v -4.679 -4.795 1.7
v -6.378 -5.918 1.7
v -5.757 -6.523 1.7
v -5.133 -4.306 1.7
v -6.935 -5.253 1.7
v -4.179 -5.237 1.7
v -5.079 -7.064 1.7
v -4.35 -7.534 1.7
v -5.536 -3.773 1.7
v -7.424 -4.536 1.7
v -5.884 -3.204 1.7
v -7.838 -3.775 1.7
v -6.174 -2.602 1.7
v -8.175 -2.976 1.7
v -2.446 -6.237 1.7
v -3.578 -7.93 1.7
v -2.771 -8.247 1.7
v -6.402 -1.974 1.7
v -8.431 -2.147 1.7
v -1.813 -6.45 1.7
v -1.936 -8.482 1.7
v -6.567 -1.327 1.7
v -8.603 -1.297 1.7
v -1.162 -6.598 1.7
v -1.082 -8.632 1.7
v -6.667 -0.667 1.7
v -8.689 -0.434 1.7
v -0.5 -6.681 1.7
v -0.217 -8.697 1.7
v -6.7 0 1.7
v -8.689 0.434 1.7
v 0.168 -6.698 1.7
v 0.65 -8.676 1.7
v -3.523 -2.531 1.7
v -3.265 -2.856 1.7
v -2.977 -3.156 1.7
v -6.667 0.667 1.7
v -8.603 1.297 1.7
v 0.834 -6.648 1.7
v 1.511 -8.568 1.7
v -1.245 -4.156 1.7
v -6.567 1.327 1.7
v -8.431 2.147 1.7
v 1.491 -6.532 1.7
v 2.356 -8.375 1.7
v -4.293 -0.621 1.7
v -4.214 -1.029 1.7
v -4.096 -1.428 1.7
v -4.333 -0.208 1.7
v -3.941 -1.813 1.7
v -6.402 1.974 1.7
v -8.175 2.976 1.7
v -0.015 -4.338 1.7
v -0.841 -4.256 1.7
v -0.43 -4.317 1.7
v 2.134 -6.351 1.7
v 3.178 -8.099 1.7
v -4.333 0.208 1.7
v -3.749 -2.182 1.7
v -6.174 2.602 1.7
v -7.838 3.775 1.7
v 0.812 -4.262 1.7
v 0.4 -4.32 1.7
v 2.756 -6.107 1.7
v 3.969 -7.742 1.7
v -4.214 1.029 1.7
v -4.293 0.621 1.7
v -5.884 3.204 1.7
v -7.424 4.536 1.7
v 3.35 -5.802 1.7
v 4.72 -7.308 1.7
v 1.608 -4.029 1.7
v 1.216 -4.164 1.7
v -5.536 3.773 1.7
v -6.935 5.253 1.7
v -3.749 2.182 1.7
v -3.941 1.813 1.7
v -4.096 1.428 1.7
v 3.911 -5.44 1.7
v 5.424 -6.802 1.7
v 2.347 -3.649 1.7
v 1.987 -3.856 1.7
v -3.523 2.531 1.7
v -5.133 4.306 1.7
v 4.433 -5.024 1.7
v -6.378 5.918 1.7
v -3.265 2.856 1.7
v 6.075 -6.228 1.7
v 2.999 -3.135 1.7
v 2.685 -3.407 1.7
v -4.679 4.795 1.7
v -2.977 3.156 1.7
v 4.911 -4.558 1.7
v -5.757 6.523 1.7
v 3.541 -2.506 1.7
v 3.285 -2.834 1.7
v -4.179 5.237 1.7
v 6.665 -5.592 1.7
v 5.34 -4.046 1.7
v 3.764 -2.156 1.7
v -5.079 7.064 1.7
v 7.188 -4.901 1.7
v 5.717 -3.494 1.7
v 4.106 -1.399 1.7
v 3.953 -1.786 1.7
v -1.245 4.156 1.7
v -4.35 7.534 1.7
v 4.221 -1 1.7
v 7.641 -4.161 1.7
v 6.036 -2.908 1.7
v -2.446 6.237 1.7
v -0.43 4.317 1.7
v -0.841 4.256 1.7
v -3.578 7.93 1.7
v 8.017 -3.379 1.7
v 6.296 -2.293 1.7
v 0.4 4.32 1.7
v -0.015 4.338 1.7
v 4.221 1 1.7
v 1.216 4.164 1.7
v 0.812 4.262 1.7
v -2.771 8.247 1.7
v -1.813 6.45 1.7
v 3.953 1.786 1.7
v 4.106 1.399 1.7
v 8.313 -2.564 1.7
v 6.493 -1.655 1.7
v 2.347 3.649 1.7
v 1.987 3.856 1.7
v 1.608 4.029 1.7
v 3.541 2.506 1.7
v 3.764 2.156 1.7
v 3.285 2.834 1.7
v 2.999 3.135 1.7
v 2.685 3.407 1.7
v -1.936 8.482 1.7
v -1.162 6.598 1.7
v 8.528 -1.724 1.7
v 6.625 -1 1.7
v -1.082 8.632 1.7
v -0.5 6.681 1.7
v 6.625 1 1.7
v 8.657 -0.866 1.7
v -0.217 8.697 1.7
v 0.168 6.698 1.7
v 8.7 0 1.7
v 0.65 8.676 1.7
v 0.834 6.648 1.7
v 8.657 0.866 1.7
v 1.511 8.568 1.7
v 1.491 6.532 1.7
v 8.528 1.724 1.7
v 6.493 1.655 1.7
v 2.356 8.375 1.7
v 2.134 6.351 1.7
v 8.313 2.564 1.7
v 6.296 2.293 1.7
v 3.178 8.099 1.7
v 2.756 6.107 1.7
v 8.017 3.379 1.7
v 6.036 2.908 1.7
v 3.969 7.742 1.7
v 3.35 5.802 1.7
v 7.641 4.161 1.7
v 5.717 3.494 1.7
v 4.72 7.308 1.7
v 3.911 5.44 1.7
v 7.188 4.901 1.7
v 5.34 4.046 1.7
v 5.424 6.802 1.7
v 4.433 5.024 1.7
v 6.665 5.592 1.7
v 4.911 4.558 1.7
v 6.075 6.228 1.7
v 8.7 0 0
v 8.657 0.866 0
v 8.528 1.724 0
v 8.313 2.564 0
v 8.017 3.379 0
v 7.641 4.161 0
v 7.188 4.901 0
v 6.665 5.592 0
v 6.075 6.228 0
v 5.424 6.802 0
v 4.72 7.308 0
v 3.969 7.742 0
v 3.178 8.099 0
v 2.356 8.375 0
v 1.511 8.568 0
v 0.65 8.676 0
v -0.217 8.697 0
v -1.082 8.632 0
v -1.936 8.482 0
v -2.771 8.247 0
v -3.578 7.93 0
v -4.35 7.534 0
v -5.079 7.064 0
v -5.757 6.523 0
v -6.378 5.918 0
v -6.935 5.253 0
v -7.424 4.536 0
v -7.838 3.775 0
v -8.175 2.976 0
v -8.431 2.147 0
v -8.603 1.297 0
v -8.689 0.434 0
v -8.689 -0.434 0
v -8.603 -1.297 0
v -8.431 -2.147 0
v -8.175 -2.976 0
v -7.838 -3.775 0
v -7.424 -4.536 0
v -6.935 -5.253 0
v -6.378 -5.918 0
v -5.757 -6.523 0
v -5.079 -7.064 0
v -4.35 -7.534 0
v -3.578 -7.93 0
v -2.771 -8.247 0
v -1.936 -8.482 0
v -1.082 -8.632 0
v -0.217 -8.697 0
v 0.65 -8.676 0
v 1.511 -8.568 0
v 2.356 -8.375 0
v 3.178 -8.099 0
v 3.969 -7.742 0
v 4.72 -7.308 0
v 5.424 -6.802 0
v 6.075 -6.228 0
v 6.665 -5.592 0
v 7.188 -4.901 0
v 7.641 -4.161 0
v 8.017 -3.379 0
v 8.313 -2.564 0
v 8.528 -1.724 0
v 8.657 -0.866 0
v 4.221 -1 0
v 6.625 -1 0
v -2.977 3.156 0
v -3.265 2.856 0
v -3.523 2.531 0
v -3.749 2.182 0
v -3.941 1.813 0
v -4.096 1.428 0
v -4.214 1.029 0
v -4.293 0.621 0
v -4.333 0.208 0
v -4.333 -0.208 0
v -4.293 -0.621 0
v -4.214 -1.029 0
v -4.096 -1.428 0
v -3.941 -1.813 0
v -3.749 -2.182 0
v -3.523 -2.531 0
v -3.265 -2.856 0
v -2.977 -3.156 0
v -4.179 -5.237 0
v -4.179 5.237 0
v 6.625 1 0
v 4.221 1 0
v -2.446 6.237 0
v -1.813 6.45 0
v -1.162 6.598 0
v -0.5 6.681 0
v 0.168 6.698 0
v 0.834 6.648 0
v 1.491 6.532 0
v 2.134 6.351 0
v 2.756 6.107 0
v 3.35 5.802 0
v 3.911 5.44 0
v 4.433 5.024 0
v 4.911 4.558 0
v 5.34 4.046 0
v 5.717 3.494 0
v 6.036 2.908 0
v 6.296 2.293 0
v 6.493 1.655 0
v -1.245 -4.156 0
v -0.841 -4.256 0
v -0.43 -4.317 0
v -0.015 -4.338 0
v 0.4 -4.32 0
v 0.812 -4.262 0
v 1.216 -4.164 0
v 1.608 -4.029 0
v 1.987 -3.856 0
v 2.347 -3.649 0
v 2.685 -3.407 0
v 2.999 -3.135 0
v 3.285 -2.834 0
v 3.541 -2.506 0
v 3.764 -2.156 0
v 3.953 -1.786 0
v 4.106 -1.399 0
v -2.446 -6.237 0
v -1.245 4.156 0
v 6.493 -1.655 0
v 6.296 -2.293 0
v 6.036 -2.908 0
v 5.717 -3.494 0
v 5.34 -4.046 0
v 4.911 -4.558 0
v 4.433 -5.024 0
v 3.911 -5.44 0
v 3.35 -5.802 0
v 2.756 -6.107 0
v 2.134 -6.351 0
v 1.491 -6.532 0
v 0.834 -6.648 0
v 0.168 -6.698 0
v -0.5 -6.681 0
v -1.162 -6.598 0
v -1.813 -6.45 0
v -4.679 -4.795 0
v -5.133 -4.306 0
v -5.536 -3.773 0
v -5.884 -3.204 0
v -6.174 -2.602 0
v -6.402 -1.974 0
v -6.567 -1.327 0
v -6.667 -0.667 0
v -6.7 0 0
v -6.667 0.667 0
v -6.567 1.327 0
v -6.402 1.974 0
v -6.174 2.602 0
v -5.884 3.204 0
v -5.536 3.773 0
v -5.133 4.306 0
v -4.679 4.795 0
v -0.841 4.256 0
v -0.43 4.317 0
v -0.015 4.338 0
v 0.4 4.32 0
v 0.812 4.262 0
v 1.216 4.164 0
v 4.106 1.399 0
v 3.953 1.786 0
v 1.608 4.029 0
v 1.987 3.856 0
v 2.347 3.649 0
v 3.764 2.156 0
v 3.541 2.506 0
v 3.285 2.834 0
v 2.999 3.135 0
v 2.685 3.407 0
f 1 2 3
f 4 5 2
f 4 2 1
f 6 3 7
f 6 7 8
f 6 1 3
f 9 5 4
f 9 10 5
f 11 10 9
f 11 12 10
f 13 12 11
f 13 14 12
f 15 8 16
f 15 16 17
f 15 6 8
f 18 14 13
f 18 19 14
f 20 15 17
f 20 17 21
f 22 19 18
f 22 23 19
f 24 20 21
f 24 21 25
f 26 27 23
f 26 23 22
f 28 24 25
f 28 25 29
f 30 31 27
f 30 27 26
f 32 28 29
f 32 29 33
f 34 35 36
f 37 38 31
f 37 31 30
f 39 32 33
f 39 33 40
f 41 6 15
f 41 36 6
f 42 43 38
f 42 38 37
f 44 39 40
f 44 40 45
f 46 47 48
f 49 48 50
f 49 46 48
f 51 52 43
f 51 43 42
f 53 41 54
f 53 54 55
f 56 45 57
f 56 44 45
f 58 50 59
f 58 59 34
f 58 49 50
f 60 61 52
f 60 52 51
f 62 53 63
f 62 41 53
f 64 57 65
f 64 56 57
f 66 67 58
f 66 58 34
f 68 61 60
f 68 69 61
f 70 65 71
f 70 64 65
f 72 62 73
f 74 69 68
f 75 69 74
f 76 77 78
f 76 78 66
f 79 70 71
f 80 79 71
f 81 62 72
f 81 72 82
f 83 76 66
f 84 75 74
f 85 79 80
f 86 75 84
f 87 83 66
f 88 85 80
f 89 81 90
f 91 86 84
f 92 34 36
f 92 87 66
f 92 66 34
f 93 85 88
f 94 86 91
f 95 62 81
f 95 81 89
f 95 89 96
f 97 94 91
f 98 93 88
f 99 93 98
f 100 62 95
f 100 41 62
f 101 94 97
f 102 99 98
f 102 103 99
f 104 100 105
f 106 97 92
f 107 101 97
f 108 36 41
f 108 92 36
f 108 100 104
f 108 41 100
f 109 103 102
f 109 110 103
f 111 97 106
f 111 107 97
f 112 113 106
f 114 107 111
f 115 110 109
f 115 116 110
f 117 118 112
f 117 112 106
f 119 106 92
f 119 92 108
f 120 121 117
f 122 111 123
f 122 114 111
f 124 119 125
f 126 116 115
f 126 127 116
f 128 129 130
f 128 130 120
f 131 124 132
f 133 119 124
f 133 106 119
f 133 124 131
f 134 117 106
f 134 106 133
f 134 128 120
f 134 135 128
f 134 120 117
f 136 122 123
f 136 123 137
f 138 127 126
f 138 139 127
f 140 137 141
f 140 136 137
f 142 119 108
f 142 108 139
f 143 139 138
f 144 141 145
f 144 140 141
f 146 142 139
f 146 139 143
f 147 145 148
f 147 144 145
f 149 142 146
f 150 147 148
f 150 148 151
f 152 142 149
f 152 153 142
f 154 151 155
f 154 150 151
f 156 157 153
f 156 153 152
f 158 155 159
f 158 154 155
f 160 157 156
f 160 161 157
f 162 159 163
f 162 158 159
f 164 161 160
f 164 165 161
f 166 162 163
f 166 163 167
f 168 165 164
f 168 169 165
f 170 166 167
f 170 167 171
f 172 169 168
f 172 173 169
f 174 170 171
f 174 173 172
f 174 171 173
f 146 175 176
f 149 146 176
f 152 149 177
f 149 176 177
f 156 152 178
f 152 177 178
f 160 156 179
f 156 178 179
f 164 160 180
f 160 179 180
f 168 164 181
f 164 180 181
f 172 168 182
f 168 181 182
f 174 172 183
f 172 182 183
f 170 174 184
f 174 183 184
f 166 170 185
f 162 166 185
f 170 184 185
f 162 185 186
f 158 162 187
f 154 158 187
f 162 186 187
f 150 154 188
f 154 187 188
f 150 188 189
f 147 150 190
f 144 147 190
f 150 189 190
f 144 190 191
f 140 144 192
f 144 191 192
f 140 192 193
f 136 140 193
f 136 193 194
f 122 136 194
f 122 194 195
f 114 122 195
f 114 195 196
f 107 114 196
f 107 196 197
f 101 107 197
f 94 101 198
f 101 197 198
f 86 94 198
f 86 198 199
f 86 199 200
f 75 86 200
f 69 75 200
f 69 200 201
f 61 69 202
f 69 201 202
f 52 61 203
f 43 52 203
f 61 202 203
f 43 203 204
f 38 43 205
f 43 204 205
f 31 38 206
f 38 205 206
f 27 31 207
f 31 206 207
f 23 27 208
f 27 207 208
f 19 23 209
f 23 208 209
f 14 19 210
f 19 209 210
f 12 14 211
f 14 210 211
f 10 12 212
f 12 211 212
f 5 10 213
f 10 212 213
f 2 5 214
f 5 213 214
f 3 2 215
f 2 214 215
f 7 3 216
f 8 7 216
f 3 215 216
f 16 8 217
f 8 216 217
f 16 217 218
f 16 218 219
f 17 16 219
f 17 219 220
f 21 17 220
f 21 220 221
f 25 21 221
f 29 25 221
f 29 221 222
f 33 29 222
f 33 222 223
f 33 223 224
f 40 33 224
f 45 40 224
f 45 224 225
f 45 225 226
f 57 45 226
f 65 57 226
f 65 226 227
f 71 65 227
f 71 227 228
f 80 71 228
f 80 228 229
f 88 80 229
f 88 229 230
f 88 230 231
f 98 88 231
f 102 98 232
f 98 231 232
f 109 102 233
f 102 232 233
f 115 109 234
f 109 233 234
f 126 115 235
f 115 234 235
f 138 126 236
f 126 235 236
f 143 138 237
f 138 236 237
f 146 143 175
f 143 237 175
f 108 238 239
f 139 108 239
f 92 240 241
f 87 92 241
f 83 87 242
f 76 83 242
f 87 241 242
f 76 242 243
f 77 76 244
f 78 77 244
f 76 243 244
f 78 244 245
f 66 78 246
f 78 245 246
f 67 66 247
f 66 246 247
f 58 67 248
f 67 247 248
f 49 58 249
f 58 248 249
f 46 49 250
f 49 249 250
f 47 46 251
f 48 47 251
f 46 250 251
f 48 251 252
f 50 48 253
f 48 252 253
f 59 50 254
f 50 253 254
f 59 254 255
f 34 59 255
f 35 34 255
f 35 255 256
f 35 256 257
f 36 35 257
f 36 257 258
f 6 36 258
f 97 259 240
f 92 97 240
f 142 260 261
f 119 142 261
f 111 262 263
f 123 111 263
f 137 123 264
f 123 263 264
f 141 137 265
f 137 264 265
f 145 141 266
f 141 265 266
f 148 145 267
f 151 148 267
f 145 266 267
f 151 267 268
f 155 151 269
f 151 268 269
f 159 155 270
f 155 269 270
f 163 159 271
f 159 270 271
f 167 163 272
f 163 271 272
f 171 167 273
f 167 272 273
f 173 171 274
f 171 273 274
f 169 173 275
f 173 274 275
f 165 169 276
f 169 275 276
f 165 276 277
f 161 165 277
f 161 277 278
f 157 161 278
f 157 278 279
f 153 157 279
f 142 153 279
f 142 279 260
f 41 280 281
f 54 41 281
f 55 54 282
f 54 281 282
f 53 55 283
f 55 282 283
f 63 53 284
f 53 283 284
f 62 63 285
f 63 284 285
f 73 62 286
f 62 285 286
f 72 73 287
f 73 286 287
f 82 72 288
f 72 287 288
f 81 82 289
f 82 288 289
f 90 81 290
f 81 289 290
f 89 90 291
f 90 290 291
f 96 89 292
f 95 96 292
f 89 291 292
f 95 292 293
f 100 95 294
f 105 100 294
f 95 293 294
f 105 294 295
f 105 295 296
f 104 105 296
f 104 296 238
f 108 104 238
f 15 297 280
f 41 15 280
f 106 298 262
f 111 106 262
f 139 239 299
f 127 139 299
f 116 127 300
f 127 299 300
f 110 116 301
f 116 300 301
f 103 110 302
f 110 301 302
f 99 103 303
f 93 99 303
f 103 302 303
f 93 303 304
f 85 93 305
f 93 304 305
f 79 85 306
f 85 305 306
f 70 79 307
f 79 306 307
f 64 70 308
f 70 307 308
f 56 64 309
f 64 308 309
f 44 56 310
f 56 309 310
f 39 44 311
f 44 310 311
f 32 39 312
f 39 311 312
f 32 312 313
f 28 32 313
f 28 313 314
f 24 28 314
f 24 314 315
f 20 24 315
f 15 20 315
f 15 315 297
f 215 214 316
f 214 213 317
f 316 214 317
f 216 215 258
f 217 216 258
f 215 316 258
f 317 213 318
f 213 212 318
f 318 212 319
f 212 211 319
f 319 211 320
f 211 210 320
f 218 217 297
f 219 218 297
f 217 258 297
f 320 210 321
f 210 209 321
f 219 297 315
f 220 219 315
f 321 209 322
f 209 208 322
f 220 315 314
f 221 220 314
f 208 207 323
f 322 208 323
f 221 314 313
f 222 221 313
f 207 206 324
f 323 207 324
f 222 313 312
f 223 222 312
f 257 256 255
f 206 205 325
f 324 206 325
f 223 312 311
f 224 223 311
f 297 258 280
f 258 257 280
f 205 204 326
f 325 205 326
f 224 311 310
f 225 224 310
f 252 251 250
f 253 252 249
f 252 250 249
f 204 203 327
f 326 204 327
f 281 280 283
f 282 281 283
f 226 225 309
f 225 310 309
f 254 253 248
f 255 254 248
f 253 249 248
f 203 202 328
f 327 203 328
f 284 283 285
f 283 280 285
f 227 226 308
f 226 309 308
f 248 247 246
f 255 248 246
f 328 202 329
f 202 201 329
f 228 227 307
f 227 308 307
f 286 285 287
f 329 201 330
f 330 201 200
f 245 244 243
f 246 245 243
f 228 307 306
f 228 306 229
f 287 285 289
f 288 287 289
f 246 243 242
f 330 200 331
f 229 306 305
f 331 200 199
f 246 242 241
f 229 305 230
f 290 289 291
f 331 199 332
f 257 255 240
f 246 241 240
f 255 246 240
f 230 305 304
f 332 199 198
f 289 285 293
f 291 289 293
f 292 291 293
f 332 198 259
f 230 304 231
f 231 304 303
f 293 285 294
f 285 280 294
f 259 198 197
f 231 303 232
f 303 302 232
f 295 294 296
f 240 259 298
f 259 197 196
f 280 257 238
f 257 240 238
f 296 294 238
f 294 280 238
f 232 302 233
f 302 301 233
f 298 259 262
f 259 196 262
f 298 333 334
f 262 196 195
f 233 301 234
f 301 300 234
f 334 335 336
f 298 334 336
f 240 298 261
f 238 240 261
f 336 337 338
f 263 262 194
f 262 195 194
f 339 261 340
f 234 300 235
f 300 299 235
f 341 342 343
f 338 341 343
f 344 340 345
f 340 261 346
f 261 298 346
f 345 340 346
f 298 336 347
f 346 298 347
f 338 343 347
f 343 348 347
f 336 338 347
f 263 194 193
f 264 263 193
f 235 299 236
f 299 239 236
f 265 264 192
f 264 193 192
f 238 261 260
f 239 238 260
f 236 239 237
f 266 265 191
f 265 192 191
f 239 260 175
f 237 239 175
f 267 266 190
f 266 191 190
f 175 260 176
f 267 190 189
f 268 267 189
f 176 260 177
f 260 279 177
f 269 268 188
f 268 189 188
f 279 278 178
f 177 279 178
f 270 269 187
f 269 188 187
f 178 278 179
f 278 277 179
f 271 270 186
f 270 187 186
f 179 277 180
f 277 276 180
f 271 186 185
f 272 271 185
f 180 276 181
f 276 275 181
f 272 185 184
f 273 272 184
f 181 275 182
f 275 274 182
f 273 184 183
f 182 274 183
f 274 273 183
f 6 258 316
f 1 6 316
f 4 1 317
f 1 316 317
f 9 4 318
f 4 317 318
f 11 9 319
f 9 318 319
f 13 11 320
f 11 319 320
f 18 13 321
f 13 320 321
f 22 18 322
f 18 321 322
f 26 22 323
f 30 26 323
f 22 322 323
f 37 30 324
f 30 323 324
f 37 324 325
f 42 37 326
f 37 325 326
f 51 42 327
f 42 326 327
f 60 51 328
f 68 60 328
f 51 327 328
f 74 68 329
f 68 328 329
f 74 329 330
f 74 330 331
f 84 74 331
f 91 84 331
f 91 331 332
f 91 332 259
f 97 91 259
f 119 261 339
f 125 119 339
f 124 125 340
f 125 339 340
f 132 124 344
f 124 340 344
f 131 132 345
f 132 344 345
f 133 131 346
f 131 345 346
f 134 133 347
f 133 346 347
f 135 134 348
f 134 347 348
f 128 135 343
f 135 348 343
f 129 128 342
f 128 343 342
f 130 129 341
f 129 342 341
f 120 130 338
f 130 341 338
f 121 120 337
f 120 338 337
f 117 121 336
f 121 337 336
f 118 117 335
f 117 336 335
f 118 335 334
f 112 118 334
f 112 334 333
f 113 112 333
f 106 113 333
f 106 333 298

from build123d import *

# Parameters (mm, degrees)
F0_R     = 8.7
F1_DEPTH = 1.7


with BuildPart() as f1:
    # F0 (on Top) → F1 (new body)
    with BuildSketch(Plane.XY):
        Circle(F0_R)
        with BuildLine():
            Line((-4.178502, 5.237377), (-2.976663, 3.155732))
            ThreePointArc((-2.976663, 3.155732), (-4.338107, 0), (-2.976663, -3.155732))
            Line((-2.976663, -3.155732), (-4.178502, -5.237377))
            ThreePointArc((-4.178502, -5.237377), (-6.7, 0), (-4.178502, 5.237377))
        make_face(mode=Mode.SUBTRACT)
        with BuildLine():
            ThreePointArc((-1.244613, -4.155732), (2.169054, -3.756911), (4.221276, -1))
            Line((4.221276, -1), (6.624953, -1))
            ThreePointArc((6.624953, -1), (3.35, -5.80237), (-2.446451, -6.237377))
            Line((-2.446451, -6.237377), (-1.244613, -4.155732))
        make_face(mode=Mode.SUBTRACT)
        with BuildLine():
            Line((6.624953, 1), (4.221276, 1))
            ThreePointArc((4.221276, 1), (2.169054, 3.756911), (-1.244613, 4.155732))
            Line((-1.244613, 4.155732), (-2.446451, 6.237377))
            ThreePointArc((-2.446451, 6.237377), (3.35, 5.80237), (6.624953, 1))
        make_face(mode=Mode.SUBTRACT)
    extrude(amount=F1_DEPTH)


solid = f1.part
